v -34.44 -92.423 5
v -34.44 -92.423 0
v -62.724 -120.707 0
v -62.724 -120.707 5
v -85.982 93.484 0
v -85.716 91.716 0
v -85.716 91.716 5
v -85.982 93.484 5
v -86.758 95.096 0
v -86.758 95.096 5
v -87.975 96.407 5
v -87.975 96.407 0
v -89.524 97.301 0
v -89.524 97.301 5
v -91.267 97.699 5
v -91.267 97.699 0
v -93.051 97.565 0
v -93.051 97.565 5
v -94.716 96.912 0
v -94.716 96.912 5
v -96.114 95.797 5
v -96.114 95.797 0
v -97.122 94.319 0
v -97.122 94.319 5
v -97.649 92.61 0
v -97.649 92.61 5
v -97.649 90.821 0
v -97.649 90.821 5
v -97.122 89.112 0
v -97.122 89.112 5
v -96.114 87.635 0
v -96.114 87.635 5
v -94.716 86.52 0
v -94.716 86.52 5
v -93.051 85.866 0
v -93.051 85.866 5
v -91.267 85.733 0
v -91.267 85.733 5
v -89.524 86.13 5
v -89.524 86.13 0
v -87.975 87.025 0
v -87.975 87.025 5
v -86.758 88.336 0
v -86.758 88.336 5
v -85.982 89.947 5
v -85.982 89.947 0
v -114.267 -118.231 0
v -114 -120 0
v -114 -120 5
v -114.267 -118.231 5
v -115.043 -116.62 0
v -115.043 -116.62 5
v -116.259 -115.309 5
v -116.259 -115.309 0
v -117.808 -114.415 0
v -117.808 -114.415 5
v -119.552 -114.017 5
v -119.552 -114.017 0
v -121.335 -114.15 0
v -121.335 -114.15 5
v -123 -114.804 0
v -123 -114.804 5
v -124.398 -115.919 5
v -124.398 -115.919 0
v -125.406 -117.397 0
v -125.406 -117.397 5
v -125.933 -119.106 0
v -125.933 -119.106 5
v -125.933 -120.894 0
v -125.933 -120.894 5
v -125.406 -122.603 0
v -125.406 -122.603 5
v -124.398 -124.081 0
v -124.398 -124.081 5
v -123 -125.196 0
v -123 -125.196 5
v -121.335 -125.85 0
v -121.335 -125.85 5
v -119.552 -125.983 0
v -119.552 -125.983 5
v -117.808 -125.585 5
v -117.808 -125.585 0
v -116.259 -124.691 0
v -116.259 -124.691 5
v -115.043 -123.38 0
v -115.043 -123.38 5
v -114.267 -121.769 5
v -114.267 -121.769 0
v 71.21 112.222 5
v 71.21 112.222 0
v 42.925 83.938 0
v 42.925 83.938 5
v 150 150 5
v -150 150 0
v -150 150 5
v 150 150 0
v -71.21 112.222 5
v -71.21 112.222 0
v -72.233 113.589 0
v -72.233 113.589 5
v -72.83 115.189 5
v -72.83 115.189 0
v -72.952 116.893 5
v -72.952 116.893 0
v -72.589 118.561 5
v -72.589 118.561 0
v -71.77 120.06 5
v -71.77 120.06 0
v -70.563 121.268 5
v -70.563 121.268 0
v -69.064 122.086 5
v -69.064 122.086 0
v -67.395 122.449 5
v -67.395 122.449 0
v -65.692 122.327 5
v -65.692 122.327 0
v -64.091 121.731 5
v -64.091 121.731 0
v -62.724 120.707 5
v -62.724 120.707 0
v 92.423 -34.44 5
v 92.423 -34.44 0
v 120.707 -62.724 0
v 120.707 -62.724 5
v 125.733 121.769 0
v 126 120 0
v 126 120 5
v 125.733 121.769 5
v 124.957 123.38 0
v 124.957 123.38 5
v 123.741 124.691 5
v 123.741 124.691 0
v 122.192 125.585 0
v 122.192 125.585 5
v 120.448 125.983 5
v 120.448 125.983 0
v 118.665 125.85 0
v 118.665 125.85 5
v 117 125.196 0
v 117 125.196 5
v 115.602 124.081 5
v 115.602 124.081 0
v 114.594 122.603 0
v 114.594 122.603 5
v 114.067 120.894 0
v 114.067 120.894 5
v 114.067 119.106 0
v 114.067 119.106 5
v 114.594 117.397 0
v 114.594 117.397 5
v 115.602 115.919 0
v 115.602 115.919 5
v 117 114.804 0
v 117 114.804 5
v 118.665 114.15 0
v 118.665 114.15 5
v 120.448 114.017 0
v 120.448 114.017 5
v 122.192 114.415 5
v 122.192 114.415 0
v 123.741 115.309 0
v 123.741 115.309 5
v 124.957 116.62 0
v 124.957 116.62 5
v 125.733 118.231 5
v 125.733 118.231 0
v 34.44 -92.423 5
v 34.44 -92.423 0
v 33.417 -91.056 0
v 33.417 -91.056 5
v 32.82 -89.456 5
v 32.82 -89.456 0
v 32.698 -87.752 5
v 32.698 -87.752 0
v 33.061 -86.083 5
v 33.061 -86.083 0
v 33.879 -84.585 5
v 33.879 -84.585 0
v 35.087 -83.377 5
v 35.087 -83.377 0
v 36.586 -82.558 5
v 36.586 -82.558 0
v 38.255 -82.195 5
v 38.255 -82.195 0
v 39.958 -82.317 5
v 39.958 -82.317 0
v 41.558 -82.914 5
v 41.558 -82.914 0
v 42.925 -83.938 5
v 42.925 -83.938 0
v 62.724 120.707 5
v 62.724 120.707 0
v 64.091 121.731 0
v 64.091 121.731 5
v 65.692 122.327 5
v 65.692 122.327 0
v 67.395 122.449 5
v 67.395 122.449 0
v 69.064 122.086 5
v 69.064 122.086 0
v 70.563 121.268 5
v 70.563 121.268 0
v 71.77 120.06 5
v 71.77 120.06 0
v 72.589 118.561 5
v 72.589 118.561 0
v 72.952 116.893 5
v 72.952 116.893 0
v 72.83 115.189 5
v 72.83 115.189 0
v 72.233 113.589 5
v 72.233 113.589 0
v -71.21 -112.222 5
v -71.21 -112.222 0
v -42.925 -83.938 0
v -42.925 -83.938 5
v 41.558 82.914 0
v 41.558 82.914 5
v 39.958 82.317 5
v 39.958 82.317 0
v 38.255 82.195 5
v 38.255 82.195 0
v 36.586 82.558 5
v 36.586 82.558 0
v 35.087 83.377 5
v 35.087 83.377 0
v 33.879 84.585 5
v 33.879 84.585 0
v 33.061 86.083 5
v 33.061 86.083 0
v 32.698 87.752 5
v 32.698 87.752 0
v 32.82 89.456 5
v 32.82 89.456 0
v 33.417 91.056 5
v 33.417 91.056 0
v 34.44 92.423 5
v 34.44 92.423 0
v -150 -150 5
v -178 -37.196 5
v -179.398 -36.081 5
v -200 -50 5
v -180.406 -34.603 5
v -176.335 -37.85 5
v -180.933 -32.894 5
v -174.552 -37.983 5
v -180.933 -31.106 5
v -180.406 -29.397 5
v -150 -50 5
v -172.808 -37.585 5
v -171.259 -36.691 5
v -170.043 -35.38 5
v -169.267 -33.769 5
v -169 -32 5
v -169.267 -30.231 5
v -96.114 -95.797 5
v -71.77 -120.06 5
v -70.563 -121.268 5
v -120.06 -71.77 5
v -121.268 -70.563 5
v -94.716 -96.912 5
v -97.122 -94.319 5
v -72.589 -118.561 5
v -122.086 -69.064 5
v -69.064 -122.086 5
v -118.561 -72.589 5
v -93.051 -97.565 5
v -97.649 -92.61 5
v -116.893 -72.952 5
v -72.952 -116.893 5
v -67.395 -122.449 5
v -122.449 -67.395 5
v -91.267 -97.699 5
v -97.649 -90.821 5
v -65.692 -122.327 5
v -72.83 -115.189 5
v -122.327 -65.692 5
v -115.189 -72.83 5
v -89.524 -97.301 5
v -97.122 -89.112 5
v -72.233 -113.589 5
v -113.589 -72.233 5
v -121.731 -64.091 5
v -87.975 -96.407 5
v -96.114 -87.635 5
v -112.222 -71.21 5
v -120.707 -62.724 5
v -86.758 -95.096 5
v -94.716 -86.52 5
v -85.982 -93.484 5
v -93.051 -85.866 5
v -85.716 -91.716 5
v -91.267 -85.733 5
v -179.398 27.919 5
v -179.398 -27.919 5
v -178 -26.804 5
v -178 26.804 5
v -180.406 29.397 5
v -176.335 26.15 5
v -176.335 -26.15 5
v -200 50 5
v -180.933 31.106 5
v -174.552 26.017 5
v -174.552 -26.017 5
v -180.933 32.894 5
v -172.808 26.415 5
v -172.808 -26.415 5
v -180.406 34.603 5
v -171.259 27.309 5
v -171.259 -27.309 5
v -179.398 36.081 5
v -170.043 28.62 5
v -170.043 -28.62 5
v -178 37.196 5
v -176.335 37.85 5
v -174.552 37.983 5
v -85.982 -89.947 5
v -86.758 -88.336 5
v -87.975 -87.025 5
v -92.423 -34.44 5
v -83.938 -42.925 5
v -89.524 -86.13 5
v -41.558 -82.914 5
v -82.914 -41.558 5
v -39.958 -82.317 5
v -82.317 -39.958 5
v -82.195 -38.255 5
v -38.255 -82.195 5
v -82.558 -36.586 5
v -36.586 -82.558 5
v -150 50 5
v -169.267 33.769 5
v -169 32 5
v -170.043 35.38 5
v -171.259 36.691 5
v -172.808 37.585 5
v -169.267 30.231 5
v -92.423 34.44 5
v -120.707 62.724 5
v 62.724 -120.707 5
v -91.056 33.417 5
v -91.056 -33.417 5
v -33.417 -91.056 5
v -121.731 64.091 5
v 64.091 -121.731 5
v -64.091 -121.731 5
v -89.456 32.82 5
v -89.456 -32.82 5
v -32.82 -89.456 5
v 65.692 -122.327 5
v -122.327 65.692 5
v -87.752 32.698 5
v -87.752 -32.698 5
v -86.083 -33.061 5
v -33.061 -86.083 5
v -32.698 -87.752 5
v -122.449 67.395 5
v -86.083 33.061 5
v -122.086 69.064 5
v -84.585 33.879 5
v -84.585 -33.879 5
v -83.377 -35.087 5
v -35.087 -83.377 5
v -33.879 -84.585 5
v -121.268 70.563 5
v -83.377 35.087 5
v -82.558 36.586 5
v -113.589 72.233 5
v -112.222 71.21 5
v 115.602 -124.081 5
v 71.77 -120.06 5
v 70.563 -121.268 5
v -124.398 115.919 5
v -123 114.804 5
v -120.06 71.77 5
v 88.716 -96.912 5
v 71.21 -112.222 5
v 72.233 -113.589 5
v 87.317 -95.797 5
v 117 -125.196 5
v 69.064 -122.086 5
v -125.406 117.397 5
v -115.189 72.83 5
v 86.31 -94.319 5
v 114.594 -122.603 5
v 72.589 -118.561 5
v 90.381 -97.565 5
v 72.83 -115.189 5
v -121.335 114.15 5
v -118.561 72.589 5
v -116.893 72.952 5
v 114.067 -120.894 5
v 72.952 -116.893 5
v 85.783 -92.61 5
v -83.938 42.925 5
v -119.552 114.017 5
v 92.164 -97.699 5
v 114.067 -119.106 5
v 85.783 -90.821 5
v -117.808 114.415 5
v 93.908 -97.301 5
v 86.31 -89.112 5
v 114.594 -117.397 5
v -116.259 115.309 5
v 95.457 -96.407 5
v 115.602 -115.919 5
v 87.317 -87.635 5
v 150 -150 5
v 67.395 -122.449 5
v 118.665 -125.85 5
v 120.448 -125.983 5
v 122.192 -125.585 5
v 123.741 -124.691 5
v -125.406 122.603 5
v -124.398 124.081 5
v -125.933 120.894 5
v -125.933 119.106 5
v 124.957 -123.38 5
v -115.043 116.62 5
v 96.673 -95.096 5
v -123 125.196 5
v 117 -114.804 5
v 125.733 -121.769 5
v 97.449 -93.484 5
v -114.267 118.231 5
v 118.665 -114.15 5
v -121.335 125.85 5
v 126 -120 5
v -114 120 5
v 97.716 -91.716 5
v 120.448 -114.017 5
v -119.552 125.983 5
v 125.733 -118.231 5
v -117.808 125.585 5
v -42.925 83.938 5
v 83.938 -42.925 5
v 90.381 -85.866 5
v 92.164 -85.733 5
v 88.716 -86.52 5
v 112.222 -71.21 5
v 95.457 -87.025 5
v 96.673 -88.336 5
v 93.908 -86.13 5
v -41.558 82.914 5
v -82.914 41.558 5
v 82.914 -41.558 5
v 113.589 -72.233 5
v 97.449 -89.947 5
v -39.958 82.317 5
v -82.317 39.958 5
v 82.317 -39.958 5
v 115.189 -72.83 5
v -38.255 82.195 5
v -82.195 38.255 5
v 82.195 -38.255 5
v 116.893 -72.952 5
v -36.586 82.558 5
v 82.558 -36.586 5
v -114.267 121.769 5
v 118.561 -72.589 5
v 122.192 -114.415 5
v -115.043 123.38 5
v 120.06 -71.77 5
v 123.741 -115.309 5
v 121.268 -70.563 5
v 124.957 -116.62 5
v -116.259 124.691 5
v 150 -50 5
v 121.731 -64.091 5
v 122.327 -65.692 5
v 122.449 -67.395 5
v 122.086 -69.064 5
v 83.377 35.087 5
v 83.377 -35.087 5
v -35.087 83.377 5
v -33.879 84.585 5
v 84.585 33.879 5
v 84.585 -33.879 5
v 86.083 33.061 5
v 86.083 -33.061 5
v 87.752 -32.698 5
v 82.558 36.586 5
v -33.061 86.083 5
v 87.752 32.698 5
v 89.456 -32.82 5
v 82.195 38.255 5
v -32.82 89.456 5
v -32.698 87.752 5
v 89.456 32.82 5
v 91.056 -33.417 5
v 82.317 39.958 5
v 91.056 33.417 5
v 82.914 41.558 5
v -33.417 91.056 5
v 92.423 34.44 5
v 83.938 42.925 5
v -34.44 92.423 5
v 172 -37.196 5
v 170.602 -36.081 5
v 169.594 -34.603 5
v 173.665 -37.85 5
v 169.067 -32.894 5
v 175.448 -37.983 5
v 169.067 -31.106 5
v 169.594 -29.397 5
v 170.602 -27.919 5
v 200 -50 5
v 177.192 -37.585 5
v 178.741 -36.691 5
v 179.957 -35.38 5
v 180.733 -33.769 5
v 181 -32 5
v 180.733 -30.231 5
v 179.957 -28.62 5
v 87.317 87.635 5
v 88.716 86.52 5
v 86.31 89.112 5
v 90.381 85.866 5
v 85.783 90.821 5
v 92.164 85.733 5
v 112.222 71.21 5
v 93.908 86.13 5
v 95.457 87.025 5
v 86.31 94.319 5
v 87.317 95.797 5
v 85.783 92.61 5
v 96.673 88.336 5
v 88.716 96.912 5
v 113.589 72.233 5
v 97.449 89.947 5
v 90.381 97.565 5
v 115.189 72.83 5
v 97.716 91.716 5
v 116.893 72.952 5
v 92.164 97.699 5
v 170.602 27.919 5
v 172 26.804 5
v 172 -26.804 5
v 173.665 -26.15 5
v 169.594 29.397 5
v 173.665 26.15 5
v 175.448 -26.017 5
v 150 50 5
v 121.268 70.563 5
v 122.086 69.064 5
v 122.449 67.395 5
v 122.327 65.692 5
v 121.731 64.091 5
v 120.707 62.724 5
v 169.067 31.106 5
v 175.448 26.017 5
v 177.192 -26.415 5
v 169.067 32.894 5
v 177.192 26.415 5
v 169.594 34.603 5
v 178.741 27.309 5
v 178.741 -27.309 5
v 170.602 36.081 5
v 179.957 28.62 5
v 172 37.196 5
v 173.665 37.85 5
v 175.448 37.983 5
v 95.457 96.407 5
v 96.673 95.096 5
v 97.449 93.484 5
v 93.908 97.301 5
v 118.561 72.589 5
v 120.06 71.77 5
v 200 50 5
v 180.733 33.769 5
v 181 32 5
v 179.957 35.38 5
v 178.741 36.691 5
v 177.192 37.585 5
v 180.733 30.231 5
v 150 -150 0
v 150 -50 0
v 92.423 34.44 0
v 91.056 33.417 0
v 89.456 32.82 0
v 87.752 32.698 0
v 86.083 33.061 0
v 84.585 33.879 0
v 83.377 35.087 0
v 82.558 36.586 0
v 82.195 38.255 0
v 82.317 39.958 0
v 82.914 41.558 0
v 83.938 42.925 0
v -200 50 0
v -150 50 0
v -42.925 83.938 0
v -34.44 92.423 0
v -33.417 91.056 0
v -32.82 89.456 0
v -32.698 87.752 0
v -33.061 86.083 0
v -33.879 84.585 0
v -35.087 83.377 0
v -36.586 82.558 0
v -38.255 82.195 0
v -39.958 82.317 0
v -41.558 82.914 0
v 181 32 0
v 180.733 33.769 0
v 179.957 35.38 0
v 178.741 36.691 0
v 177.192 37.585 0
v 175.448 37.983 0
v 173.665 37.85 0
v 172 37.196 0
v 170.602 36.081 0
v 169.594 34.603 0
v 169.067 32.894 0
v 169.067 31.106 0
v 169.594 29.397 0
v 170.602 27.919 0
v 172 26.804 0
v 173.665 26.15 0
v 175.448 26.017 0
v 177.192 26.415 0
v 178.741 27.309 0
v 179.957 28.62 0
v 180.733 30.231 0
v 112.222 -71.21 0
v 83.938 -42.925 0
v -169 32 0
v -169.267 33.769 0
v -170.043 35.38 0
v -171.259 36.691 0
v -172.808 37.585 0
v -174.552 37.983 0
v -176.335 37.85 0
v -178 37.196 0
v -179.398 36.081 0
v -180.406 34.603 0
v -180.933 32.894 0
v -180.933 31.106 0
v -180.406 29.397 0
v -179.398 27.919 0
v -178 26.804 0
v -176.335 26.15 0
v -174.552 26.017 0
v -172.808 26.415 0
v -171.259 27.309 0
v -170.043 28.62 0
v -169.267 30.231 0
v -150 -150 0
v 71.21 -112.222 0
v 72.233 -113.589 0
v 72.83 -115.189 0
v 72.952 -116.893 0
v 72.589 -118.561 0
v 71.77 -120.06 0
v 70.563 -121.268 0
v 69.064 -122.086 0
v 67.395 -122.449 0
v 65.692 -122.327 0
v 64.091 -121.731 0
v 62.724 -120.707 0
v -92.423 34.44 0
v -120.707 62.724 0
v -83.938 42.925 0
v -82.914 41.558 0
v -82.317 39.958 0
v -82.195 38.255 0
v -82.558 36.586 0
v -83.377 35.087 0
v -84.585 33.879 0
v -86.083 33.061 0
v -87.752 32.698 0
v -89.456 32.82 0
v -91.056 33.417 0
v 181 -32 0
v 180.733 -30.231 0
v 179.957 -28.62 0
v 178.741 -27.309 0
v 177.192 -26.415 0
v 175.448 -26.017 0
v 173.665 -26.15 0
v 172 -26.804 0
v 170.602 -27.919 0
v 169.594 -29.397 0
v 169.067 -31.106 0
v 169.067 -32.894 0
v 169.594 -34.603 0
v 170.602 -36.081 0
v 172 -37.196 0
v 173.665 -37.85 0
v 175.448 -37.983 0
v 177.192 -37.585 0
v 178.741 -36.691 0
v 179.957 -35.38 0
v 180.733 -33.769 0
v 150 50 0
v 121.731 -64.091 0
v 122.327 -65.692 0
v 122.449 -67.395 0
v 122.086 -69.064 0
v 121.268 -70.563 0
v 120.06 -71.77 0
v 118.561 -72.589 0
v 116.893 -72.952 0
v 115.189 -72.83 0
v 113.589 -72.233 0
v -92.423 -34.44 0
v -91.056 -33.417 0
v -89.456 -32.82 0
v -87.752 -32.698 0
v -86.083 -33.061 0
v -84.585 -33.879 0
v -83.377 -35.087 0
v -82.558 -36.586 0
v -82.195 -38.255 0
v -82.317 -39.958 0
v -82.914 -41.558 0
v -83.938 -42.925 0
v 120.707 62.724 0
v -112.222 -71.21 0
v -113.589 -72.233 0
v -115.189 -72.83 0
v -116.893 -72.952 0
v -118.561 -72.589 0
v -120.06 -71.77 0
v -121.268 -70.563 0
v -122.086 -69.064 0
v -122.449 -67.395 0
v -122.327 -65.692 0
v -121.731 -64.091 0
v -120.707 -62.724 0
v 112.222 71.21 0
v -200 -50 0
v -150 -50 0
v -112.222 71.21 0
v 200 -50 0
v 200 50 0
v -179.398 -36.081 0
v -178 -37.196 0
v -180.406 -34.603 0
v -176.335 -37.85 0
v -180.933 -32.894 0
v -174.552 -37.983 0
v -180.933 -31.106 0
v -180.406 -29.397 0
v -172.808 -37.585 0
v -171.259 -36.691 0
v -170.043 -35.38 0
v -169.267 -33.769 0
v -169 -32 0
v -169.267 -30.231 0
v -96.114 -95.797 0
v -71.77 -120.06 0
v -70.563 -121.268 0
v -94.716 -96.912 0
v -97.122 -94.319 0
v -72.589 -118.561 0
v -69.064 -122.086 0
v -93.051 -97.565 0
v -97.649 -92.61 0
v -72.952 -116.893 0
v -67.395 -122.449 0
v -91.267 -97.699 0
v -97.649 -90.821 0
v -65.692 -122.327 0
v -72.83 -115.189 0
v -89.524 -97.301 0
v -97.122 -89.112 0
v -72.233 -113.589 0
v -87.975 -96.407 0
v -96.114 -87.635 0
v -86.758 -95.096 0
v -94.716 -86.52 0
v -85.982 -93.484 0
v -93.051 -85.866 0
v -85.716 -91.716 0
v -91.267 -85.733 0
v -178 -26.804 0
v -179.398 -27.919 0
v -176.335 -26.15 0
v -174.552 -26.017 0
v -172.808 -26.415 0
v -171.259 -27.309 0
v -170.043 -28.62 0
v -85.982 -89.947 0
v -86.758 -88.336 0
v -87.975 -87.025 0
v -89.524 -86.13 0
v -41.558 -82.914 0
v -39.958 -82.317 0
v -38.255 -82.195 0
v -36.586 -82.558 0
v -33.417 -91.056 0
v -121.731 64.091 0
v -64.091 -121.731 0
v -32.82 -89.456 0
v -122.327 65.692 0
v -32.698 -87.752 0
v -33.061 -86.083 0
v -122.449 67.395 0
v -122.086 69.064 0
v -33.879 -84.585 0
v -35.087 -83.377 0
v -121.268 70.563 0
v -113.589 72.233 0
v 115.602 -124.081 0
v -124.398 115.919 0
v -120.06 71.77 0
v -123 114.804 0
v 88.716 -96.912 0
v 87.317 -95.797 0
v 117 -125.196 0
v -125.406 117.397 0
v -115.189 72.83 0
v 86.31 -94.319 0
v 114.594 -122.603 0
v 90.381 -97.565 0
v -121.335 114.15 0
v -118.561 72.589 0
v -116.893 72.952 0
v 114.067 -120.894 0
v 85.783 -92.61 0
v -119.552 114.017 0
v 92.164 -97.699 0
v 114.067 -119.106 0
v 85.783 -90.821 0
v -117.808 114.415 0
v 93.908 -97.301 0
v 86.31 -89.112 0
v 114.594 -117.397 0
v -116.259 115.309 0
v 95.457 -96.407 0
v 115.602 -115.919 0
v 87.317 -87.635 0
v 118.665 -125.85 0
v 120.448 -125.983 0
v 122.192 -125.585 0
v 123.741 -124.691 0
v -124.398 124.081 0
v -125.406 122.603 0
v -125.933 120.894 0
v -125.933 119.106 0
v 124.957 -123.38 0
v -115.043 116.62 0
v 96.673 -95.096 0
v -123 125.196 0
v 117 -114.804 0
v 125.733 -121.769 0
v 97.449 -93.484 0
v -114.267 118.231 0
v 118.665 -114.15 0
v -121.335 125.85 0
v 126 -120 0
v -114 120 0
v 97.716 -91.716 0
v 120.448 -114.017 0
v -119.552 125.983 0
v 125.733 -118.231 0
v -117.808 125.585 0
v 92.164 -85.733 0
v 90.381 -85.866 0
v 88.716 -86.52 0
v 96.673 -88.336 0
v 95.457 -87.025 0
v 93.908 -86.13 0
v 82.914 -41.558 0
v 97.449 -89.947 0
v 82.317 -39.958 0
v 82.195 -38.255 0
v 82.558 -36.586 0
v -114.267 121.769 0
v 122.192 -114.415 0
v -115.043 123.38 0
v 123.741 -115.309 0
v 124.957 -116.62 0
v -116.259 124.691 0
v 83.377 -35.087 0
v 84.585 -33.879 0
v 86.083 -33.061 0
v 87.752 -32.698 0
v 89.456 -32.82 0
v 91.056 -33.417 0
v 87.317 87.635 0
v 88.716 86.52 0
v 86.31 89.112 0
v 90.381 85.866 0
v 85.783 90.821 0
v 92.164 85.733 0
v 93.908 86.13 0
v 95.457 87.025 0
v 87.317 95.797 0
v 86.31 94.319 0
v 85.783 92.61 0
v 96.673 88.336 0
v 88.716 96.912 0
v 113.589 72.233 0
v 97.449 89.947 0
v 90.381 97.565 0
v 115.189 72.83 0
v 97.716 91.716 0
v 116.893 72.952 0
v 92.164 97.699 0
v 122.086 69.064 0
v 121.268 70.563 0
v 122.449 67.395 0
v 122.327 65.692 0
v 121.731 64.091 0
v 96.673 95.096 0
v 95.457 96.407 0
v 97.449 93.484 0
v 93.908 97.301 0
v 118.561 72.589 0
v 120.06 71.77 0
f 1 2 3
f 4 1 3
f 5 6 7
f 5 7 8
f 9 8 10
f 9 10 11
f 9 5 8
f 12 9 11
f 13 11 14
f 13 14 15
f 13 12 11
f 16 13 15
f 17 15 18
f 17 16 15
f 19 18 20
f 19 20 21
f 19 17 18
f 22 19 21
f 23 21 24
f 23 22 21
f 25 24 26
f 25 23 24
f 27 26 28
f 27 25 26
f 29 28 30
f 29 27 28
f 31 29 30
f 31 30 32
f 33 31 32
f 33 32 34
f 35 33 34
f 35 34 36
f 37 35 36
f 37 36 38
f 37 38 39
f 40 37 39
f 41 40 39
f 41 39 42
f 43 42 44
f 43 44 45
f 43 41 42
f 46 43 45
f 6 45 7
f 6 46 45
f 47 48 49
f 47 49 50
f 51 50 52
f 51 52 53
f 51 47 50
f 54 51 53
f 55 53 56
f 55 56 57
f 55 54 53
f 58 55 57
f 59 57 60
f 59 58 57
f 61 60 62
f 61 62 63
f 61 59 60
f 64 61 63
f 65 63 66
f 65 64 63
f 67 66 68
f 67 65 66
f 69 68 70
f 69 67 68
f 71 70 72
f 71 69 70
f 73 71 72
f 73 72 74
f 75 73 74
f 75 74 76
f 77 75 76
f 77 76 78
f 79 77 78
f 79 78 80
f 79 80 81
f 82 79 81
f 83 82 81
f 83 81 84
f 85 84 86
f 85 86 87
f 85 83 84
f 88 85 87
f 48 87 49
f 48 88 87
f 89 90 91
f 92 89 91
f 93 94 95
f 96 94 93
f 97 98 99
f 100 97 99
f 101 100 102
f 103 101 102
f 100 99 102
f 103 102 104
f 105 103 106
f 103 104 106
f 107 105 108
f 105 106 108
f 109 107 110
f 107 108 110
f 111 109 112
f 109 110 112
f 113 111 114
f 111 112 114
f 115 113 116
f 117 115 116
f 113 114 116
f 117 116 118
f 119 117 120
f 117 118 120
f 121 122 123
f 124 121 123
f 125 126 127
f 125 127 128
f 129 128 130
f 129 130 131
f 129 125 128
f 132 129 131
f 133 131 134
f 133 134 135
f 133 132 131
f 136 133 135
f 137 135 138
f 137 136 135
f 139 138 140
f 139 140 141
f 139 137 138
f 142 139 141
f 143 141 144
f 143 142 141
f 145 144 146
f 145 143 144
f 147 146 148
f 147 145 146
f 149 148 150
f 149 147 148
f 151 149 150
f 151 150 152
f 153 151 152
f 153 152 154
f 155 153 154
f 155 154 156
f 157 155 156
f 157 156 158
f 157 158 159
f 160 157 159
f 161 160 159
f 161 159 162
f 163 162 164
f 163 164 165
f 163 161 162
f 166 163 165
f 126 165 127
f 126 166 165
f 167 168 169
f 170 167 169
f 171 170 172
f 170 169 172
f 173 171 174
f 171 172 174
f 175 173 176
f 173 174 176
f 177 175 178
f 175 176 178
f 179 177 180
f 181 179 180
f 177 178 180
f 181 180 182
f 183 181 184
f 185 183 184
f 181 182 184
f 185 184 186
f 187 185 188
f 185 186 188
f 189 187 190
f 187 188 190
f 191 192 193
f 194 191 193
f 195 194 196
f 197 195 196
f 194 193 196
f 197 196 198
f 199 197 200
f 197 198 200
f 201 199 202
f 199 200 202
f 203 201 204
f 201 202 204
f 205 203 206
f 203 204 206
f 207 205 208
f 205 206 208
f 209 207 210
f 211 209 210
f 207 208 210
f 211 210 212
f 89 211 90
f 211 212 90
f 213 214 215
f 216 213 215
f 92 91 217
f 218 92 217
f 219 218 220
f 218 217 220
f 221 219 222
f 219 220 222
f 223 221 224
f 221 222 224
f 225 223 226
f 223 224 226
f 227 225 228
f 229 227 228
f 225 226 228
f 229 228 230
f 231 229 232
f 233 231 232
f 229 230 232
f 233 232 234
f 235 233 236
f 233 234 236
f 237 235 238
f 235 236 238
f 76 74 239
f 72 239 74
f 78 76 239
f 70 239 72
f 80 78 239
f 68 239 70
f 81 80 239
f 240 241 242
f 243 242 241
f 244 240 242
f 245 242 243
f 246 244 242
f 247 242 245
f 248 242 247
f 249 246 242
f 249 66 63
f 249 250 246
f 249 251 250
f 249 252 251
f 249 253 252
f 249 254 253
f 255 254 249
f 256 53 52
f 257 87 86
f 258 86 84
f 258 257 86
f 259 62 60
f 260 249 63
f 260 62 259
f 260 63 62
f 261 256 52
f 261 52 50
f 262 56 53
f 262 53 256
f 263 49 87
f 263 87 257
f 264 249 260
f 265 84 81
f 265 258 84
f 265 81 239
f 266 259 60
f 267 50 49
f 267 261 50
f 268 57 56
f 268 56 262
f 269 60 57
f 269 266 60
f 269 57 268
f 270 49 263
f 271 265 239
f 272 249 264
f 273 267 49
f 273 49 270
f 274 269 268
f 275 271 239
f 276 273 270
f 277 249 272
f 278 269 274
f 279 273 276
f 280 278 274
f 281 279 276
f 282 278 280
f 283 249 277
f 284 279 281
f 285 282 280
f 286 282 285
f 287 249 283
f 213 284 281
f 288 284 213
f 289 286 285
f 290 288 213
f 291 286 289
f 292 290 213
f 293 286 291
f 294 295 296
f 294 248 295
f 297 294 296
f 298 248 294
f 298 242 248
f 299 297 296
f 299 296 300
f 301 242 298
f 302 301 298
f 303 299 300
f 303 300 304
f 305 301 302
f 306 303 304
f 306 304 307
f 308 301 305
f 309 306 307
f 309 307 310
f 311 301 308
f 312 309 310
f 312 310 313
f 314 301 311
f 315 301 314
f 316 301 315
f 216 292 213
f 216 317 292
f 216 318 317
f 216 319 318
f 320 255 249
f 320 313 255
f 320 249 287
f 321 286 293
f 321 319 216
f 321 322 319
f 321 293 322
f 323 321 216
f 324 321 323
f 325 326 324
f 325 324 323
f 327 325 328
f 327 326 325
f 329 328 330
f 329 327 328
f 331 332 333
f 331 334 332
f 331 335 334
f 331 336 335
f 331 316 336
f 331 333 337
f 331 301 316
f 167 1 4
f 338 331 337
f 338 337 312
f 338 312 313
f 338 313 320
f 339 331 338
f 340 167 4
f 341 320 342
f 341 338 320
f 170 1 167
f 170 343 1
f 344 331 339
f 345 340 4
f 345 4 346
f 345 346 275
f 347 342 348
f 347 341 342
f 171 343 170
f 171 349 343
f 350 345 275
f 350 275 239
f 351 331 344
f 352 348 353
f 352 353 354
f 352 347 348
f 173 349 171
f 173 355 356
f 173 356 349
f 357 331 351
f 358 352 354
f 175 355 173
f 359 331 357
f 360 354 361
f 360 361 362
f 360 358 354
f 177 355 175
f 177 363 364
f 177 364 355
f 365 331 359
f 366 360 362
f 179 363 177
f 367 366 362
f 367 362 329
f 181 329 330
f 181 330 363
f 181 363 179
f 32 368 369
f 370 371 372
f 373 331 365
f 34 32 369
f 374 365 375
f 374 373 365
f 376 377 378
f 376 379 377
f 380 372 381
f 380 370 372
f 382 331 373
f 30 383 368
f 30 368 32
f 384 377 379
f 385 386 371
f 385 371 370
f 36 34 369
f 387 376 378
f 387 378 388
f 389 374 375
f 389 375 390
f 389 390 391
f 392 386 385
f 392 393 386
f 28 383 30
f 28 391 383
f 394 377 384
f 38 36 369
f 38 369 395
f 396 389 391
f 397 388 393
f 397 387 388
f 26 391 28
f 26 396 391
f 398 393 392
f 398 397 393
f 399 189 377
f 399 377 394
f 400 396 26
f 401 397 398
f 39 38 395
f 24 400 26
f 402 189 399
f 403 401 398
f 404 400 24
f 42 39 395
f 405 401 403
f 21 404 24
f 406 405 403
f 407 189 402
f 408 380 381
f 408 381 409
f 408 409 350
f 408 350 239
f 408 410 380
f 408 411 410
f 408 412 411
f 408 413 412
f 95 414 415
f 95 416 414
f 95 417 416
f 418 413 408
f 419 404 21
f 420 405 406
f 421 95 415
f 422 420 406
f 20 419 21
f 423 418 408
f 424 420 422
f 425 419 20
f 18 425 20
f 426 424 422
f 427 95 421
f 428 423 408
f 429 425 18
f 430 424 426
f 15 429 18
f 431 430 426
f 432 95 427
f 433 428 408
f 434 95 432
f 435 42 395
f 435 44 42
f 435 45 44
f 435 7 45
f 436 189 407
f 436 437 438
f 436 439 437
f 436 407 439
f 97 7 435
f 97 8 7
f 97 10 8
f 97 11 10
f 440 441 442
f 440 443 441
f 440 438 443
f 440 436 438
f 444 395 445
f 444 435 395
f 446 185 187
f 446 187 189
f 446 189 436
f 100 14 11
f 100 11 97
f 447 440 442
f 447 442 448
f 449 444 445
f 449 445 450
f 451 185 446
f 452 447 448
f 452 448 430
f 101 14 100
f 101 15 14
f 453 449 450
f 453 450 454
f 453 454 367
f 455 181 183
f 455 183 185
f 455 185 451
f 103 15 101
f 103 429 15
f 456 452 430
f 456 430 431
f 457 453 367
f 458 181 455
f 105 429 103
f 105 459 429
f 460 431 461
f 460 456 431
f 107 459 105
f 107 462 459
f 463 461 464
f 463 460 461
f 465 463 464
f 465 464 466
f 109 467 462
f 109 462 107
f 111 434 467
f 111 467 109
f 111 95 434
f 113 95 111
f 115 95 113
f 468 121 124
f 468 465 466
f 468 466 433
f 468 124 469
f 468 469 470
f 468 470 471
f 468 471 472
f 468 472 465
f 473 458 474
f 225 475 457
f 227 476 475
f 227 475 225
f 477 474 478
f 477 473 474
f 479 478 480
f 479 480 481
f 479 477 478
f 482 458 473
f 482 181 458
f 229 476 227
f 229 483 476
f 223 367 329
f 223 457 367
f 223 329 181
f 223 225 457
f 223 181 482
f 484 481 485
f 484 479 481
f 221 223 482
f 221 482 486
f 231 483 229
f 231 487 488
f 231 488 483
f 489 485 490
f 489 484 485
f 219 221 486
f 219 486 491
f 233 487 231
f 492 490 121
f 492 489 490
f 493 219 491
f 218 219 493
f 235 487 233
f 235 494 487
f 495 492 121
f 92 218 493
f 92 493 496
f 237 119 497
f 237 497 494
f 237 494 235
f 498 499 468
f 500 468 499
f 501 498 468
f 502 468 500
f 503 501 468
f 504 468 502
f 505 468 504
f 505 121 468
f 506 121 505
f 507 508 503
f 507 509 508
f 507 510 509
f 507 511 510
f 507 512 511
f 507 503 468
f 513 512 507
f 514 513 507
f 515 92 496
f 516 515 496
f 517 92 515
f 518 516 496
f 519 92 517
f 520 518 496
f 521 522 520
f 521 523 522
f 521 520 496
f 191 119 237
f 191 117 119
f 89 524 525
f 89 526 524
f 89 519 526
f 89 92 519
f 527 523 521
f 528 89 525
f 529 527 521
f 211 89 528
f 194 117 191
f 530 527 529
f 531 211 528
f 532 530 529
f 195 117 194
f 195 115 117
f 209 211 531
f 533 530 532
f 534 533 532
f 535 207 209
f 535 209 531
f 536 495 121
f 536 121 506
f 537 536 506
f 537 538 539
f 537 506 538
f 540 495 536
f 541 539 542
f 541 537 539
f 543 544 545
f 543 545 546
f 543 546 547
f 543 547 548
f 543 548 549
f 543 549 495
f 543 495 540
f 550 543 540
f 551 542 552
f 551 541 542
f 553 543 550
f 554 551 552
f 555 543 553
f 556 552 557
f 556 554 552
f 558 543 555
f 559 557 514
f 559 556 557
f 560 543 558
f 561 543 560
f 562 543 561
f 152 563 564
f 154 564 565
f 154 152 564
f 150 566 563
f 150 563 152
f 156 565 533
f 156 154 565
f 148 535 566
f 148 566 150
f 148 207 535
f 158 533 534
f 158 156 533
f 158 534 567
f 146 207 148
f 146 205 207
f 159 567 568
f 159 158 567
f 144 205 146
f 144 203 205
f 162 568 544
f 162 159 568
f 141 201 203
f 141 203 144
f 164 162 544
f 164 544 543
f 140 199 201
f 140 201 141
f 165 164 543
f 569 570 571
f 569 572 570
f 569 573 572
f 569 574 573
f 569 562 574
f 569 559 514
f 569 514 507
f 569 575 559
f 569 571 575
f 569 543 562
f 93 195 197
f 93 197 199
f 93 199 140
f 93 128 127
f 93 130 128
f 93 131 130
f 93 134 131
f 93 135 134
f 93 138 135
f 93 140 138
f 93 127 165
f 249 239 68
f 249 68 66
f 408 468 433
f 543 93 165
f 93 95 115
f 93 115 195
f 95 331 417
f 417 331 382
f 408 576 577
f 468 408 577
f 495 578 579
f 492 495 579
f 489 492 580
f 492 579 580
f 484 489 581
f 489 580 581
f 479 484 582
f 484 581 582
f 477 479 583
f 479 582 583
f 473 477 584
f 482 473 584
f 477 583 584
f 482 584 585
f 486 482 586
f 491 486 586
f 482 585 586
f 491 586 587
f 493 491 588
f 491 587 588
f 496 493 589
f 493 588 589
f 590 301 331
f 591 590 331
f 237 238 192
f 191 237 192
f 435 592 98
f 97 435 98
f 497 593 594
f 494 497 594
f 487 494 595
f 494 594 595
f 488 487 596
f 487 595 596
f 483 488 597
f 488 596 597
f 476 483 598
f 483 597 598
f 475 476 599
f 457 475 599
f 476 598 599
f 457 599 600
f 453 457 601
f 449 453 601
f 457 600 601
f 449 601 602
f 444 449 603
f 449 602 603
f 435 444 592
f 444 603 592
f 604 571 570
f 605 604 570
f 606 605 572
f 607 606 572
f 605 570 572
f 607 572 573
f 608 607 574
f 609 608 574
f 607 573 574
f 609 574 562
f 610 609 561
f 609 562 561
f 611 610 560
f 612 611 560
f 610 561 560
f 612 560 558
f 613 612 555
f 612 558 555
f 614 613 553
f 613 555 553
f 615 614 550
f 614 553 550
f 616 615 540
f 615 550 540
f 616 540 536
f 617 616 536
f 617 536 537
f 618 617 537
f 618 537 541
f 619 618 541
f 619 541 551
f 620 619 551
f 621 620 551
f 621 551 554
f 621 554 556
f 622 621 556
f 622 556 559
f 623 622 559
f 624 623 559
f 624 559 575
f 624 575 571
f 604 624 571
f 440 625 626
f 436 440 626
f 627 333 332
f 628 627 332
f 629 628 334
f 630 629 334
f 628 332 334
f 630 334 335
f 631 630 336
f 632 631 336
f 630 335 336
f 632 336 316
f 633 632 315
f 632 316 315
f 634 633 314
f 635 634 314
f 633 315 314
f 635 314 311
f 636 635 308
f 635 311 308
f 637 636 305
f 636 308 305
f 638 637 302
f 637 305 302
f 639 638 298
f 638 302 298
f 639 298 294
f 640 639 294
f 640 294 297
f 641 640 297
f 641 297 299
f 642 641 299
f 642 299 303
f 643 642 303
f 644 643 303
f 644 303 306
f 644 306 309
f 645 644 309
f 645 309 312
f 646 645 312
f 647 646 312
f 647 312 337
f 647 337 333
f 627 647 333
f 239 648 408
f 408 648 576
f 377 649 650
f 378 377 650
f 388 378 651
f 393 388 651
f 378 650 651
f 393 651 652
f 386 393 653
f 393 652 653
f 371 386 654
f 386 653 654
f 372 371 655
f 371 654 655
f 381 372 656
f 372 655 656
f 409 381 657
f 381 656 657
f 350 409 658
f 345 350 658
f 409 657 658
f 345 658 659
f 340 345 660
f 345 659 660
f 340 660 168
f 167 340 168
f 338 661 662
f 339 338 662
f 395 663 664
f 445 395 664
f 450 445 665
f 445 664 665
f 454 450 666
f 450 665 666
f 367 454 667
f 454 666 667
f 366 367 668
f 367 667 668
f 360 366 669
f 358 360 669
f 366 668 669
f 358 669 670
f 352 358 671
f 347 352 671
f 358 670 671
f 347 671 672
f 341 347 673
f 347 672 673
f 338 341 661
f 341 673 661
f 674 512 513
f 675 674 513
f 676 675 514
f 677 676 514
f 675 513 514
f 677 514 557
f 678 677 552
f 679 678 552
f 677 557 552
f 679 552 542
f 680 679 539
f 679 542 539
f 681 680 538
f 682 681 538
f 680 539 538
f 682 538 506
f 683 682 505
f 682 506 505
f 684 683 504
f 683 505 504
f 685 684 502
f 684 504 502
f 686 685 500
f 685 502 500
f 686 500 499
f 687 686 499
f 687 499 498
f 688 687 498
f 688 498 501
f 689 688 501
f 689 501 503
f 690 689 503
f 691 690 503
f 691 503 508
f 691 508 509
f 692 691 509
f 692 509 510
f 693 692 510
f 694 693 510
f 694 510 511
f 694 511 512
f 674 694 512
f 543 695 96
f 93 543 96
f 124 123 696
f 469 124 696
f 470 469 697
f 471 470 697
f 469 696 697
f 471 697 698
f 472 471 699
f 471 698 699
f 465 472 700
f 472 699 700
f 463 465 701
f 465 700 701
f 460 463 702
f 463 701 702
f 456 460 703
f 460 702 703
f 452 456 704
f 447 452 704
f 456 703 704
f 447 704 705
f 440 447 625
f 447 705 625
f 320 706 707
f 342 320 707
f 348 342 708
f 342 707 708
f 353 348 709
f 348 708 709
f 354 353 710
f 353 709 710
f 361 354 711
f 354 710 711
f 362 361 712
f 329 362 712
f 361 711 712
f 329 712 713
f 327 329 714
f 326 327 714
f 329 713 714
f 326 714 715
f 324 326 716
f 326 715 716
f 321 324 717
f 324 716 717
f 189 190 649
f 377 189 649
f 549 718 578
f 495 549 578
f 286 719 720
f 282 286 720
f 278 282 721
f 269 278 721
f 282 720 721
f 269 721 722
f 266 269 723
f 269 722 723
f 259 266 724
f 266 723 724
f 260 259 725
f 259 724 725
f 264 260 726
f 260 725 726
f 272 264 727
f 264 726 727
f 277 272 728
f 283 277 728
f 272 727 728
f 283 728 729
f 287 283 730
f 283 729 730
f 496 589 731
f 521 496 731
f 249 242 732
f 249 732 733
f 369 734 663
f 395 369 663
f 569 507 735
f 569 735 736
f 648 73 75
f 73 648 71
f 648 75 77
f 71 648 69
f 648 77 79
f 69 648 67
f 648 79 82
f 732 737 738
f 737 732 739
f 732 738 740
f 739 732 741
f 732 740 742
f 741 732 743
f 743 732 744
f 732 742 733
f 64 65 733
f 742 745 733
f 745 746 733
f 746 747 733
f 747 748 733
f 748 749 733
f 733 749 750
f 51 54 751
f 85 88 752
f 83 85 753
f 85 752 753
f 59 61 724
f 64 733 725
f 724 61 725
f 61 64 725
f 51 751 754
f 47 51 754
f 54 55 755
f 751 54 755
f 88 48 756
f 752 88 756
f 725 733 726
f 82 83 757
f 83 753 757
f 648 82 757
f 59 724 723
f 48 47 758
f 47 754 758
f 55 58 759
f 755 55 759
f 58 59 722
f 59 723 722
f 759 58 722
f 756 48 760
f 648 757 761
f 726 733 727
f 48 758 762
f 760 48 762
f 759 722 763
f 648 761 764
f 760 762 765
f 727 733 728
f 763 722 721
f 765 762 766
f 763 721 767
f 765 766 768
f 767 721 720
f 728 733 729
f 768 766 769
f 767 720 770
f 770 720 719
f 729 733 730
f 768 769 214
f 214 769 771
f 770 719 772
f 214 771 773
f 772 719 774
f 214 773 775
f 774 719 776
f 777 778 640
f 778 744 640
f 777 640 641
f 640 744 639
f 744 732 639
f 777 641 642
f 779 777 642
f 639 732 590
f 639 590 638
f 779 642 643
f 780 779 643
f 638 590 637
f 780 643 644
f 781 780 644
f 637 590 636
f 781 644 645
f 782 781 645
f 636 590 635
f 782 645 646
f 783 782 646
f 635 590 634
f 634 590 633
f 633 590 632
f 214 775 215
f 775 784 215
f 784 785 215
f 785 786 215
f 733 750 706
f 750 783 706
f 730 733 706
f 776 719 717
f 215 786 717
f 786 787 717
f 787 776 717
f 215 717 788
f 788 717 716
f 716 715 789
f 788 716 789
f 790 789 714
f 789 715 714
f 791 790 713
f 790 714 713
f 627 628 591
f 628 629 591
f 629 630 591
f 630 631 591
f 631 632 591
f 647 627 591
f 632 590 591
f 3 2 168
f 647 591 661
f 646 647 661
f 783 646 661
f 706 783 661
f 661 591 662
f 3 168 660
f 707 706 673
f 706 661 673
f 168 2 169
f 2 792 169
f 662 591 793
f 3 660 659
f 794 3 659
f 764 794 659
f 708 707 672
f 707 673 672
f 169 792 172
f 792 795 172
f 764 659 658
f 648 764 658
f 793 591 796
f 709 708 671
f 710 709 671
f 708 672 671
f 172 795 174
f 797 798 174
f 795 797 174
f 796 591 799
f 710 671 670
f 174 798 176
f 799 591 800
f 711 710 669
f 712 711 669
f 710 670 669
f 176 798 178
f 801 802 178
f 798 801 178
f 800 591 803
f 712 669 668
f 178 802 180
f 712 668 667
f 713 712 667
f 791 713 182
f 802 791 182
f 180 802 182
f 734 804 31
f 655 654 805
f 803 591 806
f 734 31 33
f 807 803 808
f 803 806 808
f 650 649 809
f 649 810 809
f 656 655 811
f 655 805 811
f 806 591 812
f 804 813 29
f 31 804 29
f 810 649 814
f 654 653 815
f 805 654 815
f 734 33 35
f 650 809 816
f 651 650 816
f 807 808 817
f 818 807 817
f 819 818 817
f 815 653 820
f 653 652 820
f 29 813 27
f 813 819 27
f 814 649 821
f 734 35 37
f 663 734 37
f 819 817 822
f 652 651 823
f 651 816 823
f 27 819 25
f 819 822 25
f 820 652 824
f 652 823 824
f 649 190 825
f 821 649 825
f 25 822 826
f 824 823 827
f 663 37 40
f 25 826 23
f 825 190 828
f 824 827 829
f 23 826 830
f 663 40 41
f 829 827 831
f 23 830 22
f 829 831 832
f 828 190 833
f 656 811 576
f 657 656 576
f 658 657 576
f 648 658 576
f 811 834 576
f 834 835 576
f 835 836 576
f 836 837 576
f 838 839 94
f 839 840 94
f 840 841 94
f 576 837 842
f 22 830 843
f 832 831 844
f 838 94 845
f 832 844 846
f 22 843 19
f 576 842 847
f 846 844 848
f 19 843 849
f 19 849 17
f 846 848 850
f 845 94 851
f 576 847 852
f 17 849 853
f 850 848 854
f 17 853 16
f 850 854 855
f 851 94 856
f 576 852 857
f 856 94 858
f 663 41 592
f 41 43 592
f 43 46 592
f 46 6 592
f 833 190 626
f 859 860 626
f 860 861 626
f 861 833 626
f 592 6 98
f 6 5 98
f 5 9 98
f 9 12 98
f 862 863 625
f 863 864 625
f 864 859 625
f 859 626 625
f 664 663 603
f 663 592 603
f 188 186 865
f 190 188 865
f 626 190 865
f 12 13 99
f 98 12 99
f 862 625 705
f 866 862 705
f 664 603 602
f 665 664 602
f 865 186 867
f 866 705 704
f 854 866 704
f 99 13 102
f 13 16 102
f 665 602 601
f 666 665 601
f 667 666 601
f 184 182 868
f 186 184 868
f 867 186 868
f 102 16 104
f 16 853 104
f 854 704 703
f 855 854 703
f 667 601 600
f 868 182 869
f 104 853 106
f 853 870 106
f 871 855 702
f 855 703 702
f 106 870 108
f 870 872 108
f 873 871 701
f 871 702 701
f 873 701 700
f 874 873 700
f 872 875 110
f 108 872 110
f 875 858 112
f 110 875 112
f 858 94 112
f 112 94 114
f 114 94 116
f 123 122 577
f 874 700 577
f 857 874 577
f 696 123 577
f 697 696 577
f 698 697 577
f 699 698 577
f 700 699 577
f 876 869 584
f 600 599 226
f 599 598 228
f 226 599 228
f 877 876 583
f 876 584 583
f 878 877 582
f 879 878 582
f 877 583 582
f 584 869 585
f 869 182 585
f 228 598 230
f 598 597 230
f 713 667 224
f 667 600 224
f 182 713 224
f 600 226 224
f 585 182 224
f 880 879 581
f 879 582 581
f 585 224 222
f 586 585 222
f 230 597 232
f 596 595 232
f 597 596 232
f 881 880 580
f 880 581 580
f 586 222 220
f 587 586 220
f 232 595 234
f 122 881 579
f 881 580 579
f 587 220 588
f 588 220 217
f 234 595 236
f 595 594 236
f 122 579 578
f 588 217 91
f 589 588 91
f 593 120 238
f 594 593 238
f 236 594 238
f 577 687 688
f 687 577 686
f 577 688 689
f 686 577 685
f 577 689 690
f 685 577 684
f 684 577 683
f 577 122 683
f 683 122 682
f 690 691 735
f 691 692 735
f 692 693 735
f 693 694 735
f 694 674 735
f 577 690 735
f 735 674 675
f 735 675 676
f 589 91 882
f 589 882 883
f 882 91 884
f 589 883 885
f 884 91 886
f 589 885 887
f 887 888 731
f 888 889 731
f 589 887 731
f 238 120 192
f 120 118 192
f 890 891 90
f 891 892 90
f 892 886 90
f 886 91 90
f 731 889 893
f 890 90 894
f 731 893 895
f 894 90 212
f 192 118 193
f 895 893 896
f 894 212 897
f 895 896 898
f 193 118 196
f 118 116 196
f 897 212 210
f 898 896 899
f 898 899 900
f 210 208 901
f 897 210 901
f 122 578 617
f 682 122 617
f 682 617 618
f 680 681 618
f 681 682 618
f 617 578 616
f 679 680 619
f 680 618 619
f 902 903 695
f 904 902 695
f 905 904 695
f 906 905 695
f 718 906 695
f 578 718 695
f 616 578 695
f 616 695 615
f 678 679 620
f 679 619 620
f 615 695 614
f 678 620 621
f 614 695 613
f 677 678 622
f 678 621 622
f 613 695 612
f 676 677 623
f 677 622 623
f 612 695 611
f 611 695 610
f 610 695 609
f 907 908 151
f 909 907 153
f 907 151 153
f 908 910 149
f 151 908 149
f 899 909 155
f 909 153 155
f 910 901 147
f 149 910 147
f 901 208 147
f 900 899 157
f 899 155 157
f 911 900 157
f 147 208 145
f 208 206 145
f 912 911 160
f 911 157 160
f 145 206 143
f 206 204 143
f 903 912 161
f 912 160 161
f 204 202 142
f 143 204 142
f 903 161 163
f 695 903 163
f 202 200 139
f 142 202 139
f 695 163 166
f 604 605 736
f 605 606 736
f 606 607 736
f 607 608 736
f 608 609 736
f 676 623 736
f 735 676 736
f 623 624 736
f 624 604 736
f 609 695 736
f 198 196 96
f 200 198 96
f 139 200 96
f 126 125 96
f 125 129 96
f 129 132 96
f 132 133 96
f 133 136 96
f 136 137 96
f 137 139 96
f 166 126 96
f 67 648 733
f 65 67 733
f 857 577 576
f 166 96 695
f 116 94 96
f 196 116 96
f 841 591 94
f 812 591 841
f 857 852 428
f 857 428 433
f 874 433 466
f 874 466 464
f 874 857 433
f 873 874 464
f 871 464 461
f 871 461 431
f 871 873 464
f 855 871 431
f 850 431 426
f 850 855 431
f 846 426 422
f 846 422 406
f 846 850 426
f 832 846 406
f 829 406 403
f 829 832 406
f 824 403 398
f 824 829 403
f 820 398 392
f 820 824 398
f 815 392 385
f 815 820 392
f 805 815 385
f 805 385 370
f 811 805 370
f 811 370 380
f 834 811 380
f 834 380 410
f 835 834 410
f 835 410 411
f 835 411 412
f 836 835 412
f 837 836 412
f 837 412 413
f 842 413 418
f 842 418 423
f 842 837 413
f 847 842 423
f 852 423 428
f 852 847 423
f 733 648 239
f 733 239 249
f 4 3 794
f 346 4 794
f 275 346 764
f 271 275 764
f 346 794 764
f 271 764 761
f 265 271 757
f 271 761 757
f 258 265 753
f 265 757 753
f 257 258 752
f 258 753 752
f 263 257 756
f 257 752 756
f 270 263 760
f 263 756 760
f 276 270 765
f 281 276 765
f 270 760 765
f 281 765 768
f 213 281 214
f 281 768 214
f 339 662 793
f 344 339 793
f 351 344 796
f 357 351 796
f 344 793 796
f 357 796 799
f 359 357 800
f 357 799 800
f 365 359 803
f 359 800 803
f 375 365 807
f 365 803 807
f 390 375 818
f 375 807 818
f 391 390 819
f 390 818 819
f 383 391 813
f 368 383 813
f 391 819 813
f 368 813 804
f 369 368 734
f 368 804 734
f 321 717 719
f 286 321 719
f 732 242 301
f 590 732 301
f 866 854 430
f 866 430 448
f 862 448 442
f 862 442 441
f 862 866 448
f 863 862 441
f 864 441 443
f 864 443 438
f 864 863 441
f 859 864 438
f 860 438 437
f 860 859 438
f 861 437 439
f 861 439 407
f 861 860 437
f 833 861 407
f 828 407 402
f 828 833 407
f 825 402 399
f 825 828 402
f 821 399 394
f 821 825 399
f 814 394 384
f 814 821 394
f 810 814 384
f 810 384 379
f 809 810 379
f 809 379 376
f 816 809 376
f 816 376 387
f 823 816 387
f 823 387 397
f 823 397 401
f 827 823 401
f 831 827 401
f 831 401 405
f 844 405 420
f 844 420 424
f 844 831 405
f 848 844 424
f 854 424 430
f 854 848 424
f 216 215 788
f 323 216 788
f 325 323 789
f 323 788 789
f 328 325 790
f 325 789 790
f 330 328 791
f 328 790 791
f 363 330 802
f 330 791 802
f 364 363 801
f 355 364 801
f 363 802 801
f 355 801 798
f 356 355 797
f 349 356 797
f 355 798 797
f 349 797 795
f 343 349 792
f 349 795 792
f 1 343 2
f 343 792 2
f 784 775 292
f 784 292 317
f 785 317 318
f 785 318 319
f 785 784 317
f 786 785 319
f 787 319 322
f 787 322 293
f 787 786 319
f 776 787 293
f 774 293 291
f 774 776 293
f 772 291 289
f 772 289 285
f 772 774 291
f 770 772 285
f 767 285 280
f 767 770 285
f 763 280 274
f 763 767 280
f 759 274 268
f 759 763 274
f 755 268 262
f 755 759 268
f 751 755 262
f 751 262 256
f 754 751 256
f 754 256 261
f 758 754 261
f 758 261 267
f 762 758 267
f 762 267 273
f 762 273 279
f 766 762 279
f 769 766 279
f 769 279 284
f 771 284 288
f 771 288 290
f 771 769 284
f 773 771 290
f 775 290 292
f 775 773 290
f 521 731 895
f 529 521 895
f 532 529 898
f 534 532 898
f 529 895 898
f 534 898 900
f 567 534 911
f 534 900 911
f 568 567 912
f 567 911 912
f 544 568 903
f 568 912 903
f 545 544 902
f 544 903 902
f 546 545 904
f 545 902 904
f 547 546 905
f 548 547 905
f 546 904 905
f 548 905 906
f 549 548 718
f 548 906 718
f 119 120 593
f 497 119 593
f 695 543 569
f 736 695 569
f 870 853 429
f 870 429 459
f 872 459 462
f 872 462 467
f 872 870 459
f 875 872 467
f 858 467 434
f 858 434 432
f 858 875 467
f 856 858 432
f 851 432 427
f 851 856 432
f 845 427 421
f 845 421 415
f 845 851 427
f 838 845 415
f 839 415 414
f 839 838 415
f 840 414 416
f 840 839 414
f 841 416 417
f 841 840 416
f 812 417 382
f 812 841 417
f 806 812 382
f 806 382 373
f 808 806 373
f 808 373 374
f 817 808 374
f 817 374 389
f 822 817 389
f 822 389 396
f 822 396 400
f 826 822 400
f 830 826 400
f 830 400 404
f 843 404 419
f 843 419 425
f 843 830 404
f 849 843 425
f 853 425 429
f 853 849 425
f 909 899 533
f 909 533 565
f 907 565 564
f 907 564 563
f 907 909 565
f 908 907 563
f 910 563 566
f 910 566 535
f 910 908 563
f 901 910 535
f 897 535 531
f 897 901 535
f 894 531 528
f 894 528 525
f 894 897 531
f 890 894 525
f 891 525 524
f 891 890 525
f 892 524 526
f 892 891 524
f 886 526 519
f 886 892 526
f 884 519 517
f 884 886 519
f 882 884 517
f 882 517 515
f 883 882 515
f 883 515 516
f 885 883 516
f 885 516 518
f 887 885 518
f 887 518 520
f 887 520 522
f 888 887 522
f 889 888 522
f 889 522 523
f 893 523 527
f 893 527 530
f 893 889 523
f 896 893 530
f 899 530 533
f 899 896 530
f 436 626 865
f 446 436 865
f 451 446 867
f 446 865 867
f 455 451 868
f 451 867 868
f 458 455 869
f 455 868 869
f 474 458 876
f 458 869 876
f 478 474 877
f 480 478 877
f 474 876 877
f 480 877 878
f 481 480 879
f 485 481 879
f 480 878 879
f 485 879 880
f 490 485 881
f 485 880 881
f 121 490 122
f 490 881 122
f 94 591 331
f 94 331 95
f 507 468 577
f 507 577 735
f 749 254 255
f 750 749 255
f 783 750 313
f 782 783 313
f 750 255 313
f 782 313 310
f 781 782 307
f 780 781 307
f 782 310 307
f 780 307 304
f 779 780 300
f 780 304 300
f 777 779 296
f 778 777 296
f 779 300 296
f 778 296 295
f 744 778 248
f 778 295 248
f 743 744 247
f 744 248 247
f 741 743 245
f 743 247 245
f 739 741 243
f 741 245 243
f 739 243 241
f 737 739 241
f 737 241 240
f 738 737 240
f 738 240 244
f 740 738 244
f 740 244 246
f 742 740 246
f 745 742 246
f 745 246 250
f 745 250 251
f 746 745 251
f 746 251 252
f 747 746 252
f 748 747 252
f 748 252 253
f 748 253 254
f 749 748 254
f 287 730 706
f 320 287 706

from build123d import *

# Parameters (mm, degrees)
SKETCH1_W           = 300
SKETCH1_H           = 300
SKETCH1_R           = 6
BOSS_EXTRUDE1_DEPTH = 5
SKETCH2_W           = 80
SKETCH2_H           = 100
BOSS_EXTRUDE2_DEPTH = 5
SKETCH3_R           = 6
CUT_EXTRUDE1_DEPTH  = 264


with BuildPart() as part:
    # Sketch1 → Boss-Extrude1 (new body)
    with BuildSketch(Plane.XY):
        Rectangle(SKETCH1_W, SKETCH1_H)
        with Locations((-120, 120)):
            Circle(SKETCH1_R, mode=Mode.SUBTRACT)
        with Locations((120, 120)):
            Circle(SKETCH1_R, mode=Mode.SUBTRACT)
        with Locations((-120, -120)):
            Circle(SKETCH1_R, mode=Mode.SUBTRACT)
        with Locations((120, -120)):
            Circle(SKETCH1_R, mode=Mode.SUBTRACT)
        with Locations((-91.715728753, 91.715728753)):
            Circle(SKETCH1_R, mode=Mode.SUBTRACT)
        with Locations((91.715728753, 91.715728753)):
            Circle(SKETCH1_R, mode=Mode.SUBTRACT)
        with Locations((-91.715728753, -91.715728753)):
            Circle(SKETCH1_R, mode=Mode.SUBTRACT)
        with Locations((91.715728753, -91.715728753)):
            Circle(SKETCH1_R, mode=Mode.SUBTRACT)
        with BuildLine():
            Line((-62.724350724, 120.707106781), (-34.440079476, 92.422835534))
            ThreePointArc((-34.440079476, 92.422835534), (-34.440079476, 83.937554159), (-42.925360851, 83.937554159))
            Line((-42.925360851, 83.937554159), (-71.209632098, 112.221825407))
            ThreePointArc((-71.209632098, 112.221825407), (-71.209632098, 120.707106781), (-62.724350724, 120.707106781))
        make_face(mode=Mode.SUBTRACT)
        with BuildLine():
            Line((71.209632098, 112.221825407), (42.925360851, 83.937554159))
            ThreePointArc((42.925360851, 83.937554159), (34.440079476, 83.937554159), (34.440079476, 92.422835534))
            Line((34.440079476, 92.422835534), (62.724350724, 120.707106781))
            ThreePointArc((62.724350724, 120.707106781), (71.209632098, 120.707106781), (71.209632098, 112.221825407))
        make_face(mode=Mode.SUBTRACT)
        with BuildLine():
            Line((-112.221825407, 71.209632098), (-83.937554159, 42.925360851))
            ThreePointArc((-83.937554159, 42.925360851), (-83.937554159, 34.440079476), (-92.422835534, 34.440079476))
            Line((-92.422835534, 34.440079476), (-120.707106781, 62.724350724))
            ThreePointArc((-120.707106781, 62.724350724), (-120.707106781, 71.209632098), (-112.221825407, 71.209632098))
        make_face(mode=Mode.SUBTRACT)
        with BuildLine():
            Line((120.707106781, 62.724350724), (92.422835534, 34.440079476))
            ThreePointArc((92.422835534, 34.440079476), (83.937554159, 34.440079476), (83.937554159, 42.925360851))
            Line((83.937554159, 42.925360851), (112.221825407, 71.209632098))
            ThreePointArc((112.221825407, 71.209632098), (120.707106781, 71.209632098), (120.707106781, 62.724350724))
        make_face(mode=Mode.SUBTRACT)
        with BuildLine():
            Line((112.221825407, -71.209632098), (83.937554159, -42.925360851))
            ThreePointArc((83.937554159, -42.925360851), (83.937554159, -34.440079476), (92.422835534, -34.440079476))
            Line((92.422835534, -34.440079476), (120.707106781, -62.724350724))
            ThreePointArc((120.707106781, -62.724350724), (120.707106781, -71.209632098), (112.221825407, -71.209632098))
        make_face(mode=Mode.SUBTRACT)
        with BuildLine():
            Line((62.724350724, -120.707106781), (34.440079476, -92.422835534))
            ThreePointArc((34.440079476, -92.422835534), (34.440079476, -83.937554159), (42.925360851, -83.937554159))
            Line((42.925360851, -83.937554159), (71.209632098, -112.221825407))
            ThreePointArc((71.209632098, -112.221825407), (71.209632098, -120.707106781), (62.724350724, -120.707106781))
        make_face(mode=Mode.SUBTRACT)
        with BuildLine():
            Line((-71.209632098, -112.221825407), (-42.925360851, -83.937554159))
            ThreePointArc((-42.925360851, -83.937554159), (-34.440079476, -83.937554159), (-34.440079476, -92.422835534))
            Line((-34.440079476, -92.422835534), (-62.724350724, -120.707106781))
            ThreePointArc((-62.724350724, -120.707106781), (-71.209632098, -120.707106781), (-71.209632098, -112.221825407))
        make_face(mode=Mode.SUBTRACT)
        with BuildLine():
            Line((-120.707106781, -62.724350724), (-92.422835534, -34.440079476))
            ThreePointArc((-92.422835534, -34.440079476), (-83.937554159, -34.440079476), (-83.937554159, -42.925360851))
            Line((-83.937554159, -42.925360851), (-112.221825407, -71.209632098))
            ThreePointArc((-112.221825407, -71.209632098), (-120.707106781, -71.209632098), (-120.707106781, -62.724350724))
        make_face(mode=Mode.SUBTRACT)
    extrude(amount=BOSS_EXTRUDE1_DEPTH)

    # Sketch2 → Boss-Extrude2 (add)
    with BuildSketch(Plane.XY.offset(5)):
        with Locations((-160, 0)):
            Rectangle(SKETCH2_W, SKETCH2_H)
        with Locations((160, 0)):
            Rectangle(SKETCH2_W, SKETCH2_H)
    extrude(amount=-BOSS_EXTRUDE2_DEPTH)

    # Sketch3 → Cut-Extrude1 (cut)
    with BuildSketch(Plane.XY.offset(5)):
        with Locations((-175, 32)):
            Circle(SKETCH3_R)
        with Locations((-175, -32)):
            Circle(SKETCH3_R)
        with Locations((175, 32)):
            Circle(SKETCH3_R)
        with Locations((175, -32)):
            Circle(SKETCH3_R)
    extrude(amount=-CUT_EXTRUDE1_DEPTH, mode=Mode.SUBTRACT)


solid = part.part
